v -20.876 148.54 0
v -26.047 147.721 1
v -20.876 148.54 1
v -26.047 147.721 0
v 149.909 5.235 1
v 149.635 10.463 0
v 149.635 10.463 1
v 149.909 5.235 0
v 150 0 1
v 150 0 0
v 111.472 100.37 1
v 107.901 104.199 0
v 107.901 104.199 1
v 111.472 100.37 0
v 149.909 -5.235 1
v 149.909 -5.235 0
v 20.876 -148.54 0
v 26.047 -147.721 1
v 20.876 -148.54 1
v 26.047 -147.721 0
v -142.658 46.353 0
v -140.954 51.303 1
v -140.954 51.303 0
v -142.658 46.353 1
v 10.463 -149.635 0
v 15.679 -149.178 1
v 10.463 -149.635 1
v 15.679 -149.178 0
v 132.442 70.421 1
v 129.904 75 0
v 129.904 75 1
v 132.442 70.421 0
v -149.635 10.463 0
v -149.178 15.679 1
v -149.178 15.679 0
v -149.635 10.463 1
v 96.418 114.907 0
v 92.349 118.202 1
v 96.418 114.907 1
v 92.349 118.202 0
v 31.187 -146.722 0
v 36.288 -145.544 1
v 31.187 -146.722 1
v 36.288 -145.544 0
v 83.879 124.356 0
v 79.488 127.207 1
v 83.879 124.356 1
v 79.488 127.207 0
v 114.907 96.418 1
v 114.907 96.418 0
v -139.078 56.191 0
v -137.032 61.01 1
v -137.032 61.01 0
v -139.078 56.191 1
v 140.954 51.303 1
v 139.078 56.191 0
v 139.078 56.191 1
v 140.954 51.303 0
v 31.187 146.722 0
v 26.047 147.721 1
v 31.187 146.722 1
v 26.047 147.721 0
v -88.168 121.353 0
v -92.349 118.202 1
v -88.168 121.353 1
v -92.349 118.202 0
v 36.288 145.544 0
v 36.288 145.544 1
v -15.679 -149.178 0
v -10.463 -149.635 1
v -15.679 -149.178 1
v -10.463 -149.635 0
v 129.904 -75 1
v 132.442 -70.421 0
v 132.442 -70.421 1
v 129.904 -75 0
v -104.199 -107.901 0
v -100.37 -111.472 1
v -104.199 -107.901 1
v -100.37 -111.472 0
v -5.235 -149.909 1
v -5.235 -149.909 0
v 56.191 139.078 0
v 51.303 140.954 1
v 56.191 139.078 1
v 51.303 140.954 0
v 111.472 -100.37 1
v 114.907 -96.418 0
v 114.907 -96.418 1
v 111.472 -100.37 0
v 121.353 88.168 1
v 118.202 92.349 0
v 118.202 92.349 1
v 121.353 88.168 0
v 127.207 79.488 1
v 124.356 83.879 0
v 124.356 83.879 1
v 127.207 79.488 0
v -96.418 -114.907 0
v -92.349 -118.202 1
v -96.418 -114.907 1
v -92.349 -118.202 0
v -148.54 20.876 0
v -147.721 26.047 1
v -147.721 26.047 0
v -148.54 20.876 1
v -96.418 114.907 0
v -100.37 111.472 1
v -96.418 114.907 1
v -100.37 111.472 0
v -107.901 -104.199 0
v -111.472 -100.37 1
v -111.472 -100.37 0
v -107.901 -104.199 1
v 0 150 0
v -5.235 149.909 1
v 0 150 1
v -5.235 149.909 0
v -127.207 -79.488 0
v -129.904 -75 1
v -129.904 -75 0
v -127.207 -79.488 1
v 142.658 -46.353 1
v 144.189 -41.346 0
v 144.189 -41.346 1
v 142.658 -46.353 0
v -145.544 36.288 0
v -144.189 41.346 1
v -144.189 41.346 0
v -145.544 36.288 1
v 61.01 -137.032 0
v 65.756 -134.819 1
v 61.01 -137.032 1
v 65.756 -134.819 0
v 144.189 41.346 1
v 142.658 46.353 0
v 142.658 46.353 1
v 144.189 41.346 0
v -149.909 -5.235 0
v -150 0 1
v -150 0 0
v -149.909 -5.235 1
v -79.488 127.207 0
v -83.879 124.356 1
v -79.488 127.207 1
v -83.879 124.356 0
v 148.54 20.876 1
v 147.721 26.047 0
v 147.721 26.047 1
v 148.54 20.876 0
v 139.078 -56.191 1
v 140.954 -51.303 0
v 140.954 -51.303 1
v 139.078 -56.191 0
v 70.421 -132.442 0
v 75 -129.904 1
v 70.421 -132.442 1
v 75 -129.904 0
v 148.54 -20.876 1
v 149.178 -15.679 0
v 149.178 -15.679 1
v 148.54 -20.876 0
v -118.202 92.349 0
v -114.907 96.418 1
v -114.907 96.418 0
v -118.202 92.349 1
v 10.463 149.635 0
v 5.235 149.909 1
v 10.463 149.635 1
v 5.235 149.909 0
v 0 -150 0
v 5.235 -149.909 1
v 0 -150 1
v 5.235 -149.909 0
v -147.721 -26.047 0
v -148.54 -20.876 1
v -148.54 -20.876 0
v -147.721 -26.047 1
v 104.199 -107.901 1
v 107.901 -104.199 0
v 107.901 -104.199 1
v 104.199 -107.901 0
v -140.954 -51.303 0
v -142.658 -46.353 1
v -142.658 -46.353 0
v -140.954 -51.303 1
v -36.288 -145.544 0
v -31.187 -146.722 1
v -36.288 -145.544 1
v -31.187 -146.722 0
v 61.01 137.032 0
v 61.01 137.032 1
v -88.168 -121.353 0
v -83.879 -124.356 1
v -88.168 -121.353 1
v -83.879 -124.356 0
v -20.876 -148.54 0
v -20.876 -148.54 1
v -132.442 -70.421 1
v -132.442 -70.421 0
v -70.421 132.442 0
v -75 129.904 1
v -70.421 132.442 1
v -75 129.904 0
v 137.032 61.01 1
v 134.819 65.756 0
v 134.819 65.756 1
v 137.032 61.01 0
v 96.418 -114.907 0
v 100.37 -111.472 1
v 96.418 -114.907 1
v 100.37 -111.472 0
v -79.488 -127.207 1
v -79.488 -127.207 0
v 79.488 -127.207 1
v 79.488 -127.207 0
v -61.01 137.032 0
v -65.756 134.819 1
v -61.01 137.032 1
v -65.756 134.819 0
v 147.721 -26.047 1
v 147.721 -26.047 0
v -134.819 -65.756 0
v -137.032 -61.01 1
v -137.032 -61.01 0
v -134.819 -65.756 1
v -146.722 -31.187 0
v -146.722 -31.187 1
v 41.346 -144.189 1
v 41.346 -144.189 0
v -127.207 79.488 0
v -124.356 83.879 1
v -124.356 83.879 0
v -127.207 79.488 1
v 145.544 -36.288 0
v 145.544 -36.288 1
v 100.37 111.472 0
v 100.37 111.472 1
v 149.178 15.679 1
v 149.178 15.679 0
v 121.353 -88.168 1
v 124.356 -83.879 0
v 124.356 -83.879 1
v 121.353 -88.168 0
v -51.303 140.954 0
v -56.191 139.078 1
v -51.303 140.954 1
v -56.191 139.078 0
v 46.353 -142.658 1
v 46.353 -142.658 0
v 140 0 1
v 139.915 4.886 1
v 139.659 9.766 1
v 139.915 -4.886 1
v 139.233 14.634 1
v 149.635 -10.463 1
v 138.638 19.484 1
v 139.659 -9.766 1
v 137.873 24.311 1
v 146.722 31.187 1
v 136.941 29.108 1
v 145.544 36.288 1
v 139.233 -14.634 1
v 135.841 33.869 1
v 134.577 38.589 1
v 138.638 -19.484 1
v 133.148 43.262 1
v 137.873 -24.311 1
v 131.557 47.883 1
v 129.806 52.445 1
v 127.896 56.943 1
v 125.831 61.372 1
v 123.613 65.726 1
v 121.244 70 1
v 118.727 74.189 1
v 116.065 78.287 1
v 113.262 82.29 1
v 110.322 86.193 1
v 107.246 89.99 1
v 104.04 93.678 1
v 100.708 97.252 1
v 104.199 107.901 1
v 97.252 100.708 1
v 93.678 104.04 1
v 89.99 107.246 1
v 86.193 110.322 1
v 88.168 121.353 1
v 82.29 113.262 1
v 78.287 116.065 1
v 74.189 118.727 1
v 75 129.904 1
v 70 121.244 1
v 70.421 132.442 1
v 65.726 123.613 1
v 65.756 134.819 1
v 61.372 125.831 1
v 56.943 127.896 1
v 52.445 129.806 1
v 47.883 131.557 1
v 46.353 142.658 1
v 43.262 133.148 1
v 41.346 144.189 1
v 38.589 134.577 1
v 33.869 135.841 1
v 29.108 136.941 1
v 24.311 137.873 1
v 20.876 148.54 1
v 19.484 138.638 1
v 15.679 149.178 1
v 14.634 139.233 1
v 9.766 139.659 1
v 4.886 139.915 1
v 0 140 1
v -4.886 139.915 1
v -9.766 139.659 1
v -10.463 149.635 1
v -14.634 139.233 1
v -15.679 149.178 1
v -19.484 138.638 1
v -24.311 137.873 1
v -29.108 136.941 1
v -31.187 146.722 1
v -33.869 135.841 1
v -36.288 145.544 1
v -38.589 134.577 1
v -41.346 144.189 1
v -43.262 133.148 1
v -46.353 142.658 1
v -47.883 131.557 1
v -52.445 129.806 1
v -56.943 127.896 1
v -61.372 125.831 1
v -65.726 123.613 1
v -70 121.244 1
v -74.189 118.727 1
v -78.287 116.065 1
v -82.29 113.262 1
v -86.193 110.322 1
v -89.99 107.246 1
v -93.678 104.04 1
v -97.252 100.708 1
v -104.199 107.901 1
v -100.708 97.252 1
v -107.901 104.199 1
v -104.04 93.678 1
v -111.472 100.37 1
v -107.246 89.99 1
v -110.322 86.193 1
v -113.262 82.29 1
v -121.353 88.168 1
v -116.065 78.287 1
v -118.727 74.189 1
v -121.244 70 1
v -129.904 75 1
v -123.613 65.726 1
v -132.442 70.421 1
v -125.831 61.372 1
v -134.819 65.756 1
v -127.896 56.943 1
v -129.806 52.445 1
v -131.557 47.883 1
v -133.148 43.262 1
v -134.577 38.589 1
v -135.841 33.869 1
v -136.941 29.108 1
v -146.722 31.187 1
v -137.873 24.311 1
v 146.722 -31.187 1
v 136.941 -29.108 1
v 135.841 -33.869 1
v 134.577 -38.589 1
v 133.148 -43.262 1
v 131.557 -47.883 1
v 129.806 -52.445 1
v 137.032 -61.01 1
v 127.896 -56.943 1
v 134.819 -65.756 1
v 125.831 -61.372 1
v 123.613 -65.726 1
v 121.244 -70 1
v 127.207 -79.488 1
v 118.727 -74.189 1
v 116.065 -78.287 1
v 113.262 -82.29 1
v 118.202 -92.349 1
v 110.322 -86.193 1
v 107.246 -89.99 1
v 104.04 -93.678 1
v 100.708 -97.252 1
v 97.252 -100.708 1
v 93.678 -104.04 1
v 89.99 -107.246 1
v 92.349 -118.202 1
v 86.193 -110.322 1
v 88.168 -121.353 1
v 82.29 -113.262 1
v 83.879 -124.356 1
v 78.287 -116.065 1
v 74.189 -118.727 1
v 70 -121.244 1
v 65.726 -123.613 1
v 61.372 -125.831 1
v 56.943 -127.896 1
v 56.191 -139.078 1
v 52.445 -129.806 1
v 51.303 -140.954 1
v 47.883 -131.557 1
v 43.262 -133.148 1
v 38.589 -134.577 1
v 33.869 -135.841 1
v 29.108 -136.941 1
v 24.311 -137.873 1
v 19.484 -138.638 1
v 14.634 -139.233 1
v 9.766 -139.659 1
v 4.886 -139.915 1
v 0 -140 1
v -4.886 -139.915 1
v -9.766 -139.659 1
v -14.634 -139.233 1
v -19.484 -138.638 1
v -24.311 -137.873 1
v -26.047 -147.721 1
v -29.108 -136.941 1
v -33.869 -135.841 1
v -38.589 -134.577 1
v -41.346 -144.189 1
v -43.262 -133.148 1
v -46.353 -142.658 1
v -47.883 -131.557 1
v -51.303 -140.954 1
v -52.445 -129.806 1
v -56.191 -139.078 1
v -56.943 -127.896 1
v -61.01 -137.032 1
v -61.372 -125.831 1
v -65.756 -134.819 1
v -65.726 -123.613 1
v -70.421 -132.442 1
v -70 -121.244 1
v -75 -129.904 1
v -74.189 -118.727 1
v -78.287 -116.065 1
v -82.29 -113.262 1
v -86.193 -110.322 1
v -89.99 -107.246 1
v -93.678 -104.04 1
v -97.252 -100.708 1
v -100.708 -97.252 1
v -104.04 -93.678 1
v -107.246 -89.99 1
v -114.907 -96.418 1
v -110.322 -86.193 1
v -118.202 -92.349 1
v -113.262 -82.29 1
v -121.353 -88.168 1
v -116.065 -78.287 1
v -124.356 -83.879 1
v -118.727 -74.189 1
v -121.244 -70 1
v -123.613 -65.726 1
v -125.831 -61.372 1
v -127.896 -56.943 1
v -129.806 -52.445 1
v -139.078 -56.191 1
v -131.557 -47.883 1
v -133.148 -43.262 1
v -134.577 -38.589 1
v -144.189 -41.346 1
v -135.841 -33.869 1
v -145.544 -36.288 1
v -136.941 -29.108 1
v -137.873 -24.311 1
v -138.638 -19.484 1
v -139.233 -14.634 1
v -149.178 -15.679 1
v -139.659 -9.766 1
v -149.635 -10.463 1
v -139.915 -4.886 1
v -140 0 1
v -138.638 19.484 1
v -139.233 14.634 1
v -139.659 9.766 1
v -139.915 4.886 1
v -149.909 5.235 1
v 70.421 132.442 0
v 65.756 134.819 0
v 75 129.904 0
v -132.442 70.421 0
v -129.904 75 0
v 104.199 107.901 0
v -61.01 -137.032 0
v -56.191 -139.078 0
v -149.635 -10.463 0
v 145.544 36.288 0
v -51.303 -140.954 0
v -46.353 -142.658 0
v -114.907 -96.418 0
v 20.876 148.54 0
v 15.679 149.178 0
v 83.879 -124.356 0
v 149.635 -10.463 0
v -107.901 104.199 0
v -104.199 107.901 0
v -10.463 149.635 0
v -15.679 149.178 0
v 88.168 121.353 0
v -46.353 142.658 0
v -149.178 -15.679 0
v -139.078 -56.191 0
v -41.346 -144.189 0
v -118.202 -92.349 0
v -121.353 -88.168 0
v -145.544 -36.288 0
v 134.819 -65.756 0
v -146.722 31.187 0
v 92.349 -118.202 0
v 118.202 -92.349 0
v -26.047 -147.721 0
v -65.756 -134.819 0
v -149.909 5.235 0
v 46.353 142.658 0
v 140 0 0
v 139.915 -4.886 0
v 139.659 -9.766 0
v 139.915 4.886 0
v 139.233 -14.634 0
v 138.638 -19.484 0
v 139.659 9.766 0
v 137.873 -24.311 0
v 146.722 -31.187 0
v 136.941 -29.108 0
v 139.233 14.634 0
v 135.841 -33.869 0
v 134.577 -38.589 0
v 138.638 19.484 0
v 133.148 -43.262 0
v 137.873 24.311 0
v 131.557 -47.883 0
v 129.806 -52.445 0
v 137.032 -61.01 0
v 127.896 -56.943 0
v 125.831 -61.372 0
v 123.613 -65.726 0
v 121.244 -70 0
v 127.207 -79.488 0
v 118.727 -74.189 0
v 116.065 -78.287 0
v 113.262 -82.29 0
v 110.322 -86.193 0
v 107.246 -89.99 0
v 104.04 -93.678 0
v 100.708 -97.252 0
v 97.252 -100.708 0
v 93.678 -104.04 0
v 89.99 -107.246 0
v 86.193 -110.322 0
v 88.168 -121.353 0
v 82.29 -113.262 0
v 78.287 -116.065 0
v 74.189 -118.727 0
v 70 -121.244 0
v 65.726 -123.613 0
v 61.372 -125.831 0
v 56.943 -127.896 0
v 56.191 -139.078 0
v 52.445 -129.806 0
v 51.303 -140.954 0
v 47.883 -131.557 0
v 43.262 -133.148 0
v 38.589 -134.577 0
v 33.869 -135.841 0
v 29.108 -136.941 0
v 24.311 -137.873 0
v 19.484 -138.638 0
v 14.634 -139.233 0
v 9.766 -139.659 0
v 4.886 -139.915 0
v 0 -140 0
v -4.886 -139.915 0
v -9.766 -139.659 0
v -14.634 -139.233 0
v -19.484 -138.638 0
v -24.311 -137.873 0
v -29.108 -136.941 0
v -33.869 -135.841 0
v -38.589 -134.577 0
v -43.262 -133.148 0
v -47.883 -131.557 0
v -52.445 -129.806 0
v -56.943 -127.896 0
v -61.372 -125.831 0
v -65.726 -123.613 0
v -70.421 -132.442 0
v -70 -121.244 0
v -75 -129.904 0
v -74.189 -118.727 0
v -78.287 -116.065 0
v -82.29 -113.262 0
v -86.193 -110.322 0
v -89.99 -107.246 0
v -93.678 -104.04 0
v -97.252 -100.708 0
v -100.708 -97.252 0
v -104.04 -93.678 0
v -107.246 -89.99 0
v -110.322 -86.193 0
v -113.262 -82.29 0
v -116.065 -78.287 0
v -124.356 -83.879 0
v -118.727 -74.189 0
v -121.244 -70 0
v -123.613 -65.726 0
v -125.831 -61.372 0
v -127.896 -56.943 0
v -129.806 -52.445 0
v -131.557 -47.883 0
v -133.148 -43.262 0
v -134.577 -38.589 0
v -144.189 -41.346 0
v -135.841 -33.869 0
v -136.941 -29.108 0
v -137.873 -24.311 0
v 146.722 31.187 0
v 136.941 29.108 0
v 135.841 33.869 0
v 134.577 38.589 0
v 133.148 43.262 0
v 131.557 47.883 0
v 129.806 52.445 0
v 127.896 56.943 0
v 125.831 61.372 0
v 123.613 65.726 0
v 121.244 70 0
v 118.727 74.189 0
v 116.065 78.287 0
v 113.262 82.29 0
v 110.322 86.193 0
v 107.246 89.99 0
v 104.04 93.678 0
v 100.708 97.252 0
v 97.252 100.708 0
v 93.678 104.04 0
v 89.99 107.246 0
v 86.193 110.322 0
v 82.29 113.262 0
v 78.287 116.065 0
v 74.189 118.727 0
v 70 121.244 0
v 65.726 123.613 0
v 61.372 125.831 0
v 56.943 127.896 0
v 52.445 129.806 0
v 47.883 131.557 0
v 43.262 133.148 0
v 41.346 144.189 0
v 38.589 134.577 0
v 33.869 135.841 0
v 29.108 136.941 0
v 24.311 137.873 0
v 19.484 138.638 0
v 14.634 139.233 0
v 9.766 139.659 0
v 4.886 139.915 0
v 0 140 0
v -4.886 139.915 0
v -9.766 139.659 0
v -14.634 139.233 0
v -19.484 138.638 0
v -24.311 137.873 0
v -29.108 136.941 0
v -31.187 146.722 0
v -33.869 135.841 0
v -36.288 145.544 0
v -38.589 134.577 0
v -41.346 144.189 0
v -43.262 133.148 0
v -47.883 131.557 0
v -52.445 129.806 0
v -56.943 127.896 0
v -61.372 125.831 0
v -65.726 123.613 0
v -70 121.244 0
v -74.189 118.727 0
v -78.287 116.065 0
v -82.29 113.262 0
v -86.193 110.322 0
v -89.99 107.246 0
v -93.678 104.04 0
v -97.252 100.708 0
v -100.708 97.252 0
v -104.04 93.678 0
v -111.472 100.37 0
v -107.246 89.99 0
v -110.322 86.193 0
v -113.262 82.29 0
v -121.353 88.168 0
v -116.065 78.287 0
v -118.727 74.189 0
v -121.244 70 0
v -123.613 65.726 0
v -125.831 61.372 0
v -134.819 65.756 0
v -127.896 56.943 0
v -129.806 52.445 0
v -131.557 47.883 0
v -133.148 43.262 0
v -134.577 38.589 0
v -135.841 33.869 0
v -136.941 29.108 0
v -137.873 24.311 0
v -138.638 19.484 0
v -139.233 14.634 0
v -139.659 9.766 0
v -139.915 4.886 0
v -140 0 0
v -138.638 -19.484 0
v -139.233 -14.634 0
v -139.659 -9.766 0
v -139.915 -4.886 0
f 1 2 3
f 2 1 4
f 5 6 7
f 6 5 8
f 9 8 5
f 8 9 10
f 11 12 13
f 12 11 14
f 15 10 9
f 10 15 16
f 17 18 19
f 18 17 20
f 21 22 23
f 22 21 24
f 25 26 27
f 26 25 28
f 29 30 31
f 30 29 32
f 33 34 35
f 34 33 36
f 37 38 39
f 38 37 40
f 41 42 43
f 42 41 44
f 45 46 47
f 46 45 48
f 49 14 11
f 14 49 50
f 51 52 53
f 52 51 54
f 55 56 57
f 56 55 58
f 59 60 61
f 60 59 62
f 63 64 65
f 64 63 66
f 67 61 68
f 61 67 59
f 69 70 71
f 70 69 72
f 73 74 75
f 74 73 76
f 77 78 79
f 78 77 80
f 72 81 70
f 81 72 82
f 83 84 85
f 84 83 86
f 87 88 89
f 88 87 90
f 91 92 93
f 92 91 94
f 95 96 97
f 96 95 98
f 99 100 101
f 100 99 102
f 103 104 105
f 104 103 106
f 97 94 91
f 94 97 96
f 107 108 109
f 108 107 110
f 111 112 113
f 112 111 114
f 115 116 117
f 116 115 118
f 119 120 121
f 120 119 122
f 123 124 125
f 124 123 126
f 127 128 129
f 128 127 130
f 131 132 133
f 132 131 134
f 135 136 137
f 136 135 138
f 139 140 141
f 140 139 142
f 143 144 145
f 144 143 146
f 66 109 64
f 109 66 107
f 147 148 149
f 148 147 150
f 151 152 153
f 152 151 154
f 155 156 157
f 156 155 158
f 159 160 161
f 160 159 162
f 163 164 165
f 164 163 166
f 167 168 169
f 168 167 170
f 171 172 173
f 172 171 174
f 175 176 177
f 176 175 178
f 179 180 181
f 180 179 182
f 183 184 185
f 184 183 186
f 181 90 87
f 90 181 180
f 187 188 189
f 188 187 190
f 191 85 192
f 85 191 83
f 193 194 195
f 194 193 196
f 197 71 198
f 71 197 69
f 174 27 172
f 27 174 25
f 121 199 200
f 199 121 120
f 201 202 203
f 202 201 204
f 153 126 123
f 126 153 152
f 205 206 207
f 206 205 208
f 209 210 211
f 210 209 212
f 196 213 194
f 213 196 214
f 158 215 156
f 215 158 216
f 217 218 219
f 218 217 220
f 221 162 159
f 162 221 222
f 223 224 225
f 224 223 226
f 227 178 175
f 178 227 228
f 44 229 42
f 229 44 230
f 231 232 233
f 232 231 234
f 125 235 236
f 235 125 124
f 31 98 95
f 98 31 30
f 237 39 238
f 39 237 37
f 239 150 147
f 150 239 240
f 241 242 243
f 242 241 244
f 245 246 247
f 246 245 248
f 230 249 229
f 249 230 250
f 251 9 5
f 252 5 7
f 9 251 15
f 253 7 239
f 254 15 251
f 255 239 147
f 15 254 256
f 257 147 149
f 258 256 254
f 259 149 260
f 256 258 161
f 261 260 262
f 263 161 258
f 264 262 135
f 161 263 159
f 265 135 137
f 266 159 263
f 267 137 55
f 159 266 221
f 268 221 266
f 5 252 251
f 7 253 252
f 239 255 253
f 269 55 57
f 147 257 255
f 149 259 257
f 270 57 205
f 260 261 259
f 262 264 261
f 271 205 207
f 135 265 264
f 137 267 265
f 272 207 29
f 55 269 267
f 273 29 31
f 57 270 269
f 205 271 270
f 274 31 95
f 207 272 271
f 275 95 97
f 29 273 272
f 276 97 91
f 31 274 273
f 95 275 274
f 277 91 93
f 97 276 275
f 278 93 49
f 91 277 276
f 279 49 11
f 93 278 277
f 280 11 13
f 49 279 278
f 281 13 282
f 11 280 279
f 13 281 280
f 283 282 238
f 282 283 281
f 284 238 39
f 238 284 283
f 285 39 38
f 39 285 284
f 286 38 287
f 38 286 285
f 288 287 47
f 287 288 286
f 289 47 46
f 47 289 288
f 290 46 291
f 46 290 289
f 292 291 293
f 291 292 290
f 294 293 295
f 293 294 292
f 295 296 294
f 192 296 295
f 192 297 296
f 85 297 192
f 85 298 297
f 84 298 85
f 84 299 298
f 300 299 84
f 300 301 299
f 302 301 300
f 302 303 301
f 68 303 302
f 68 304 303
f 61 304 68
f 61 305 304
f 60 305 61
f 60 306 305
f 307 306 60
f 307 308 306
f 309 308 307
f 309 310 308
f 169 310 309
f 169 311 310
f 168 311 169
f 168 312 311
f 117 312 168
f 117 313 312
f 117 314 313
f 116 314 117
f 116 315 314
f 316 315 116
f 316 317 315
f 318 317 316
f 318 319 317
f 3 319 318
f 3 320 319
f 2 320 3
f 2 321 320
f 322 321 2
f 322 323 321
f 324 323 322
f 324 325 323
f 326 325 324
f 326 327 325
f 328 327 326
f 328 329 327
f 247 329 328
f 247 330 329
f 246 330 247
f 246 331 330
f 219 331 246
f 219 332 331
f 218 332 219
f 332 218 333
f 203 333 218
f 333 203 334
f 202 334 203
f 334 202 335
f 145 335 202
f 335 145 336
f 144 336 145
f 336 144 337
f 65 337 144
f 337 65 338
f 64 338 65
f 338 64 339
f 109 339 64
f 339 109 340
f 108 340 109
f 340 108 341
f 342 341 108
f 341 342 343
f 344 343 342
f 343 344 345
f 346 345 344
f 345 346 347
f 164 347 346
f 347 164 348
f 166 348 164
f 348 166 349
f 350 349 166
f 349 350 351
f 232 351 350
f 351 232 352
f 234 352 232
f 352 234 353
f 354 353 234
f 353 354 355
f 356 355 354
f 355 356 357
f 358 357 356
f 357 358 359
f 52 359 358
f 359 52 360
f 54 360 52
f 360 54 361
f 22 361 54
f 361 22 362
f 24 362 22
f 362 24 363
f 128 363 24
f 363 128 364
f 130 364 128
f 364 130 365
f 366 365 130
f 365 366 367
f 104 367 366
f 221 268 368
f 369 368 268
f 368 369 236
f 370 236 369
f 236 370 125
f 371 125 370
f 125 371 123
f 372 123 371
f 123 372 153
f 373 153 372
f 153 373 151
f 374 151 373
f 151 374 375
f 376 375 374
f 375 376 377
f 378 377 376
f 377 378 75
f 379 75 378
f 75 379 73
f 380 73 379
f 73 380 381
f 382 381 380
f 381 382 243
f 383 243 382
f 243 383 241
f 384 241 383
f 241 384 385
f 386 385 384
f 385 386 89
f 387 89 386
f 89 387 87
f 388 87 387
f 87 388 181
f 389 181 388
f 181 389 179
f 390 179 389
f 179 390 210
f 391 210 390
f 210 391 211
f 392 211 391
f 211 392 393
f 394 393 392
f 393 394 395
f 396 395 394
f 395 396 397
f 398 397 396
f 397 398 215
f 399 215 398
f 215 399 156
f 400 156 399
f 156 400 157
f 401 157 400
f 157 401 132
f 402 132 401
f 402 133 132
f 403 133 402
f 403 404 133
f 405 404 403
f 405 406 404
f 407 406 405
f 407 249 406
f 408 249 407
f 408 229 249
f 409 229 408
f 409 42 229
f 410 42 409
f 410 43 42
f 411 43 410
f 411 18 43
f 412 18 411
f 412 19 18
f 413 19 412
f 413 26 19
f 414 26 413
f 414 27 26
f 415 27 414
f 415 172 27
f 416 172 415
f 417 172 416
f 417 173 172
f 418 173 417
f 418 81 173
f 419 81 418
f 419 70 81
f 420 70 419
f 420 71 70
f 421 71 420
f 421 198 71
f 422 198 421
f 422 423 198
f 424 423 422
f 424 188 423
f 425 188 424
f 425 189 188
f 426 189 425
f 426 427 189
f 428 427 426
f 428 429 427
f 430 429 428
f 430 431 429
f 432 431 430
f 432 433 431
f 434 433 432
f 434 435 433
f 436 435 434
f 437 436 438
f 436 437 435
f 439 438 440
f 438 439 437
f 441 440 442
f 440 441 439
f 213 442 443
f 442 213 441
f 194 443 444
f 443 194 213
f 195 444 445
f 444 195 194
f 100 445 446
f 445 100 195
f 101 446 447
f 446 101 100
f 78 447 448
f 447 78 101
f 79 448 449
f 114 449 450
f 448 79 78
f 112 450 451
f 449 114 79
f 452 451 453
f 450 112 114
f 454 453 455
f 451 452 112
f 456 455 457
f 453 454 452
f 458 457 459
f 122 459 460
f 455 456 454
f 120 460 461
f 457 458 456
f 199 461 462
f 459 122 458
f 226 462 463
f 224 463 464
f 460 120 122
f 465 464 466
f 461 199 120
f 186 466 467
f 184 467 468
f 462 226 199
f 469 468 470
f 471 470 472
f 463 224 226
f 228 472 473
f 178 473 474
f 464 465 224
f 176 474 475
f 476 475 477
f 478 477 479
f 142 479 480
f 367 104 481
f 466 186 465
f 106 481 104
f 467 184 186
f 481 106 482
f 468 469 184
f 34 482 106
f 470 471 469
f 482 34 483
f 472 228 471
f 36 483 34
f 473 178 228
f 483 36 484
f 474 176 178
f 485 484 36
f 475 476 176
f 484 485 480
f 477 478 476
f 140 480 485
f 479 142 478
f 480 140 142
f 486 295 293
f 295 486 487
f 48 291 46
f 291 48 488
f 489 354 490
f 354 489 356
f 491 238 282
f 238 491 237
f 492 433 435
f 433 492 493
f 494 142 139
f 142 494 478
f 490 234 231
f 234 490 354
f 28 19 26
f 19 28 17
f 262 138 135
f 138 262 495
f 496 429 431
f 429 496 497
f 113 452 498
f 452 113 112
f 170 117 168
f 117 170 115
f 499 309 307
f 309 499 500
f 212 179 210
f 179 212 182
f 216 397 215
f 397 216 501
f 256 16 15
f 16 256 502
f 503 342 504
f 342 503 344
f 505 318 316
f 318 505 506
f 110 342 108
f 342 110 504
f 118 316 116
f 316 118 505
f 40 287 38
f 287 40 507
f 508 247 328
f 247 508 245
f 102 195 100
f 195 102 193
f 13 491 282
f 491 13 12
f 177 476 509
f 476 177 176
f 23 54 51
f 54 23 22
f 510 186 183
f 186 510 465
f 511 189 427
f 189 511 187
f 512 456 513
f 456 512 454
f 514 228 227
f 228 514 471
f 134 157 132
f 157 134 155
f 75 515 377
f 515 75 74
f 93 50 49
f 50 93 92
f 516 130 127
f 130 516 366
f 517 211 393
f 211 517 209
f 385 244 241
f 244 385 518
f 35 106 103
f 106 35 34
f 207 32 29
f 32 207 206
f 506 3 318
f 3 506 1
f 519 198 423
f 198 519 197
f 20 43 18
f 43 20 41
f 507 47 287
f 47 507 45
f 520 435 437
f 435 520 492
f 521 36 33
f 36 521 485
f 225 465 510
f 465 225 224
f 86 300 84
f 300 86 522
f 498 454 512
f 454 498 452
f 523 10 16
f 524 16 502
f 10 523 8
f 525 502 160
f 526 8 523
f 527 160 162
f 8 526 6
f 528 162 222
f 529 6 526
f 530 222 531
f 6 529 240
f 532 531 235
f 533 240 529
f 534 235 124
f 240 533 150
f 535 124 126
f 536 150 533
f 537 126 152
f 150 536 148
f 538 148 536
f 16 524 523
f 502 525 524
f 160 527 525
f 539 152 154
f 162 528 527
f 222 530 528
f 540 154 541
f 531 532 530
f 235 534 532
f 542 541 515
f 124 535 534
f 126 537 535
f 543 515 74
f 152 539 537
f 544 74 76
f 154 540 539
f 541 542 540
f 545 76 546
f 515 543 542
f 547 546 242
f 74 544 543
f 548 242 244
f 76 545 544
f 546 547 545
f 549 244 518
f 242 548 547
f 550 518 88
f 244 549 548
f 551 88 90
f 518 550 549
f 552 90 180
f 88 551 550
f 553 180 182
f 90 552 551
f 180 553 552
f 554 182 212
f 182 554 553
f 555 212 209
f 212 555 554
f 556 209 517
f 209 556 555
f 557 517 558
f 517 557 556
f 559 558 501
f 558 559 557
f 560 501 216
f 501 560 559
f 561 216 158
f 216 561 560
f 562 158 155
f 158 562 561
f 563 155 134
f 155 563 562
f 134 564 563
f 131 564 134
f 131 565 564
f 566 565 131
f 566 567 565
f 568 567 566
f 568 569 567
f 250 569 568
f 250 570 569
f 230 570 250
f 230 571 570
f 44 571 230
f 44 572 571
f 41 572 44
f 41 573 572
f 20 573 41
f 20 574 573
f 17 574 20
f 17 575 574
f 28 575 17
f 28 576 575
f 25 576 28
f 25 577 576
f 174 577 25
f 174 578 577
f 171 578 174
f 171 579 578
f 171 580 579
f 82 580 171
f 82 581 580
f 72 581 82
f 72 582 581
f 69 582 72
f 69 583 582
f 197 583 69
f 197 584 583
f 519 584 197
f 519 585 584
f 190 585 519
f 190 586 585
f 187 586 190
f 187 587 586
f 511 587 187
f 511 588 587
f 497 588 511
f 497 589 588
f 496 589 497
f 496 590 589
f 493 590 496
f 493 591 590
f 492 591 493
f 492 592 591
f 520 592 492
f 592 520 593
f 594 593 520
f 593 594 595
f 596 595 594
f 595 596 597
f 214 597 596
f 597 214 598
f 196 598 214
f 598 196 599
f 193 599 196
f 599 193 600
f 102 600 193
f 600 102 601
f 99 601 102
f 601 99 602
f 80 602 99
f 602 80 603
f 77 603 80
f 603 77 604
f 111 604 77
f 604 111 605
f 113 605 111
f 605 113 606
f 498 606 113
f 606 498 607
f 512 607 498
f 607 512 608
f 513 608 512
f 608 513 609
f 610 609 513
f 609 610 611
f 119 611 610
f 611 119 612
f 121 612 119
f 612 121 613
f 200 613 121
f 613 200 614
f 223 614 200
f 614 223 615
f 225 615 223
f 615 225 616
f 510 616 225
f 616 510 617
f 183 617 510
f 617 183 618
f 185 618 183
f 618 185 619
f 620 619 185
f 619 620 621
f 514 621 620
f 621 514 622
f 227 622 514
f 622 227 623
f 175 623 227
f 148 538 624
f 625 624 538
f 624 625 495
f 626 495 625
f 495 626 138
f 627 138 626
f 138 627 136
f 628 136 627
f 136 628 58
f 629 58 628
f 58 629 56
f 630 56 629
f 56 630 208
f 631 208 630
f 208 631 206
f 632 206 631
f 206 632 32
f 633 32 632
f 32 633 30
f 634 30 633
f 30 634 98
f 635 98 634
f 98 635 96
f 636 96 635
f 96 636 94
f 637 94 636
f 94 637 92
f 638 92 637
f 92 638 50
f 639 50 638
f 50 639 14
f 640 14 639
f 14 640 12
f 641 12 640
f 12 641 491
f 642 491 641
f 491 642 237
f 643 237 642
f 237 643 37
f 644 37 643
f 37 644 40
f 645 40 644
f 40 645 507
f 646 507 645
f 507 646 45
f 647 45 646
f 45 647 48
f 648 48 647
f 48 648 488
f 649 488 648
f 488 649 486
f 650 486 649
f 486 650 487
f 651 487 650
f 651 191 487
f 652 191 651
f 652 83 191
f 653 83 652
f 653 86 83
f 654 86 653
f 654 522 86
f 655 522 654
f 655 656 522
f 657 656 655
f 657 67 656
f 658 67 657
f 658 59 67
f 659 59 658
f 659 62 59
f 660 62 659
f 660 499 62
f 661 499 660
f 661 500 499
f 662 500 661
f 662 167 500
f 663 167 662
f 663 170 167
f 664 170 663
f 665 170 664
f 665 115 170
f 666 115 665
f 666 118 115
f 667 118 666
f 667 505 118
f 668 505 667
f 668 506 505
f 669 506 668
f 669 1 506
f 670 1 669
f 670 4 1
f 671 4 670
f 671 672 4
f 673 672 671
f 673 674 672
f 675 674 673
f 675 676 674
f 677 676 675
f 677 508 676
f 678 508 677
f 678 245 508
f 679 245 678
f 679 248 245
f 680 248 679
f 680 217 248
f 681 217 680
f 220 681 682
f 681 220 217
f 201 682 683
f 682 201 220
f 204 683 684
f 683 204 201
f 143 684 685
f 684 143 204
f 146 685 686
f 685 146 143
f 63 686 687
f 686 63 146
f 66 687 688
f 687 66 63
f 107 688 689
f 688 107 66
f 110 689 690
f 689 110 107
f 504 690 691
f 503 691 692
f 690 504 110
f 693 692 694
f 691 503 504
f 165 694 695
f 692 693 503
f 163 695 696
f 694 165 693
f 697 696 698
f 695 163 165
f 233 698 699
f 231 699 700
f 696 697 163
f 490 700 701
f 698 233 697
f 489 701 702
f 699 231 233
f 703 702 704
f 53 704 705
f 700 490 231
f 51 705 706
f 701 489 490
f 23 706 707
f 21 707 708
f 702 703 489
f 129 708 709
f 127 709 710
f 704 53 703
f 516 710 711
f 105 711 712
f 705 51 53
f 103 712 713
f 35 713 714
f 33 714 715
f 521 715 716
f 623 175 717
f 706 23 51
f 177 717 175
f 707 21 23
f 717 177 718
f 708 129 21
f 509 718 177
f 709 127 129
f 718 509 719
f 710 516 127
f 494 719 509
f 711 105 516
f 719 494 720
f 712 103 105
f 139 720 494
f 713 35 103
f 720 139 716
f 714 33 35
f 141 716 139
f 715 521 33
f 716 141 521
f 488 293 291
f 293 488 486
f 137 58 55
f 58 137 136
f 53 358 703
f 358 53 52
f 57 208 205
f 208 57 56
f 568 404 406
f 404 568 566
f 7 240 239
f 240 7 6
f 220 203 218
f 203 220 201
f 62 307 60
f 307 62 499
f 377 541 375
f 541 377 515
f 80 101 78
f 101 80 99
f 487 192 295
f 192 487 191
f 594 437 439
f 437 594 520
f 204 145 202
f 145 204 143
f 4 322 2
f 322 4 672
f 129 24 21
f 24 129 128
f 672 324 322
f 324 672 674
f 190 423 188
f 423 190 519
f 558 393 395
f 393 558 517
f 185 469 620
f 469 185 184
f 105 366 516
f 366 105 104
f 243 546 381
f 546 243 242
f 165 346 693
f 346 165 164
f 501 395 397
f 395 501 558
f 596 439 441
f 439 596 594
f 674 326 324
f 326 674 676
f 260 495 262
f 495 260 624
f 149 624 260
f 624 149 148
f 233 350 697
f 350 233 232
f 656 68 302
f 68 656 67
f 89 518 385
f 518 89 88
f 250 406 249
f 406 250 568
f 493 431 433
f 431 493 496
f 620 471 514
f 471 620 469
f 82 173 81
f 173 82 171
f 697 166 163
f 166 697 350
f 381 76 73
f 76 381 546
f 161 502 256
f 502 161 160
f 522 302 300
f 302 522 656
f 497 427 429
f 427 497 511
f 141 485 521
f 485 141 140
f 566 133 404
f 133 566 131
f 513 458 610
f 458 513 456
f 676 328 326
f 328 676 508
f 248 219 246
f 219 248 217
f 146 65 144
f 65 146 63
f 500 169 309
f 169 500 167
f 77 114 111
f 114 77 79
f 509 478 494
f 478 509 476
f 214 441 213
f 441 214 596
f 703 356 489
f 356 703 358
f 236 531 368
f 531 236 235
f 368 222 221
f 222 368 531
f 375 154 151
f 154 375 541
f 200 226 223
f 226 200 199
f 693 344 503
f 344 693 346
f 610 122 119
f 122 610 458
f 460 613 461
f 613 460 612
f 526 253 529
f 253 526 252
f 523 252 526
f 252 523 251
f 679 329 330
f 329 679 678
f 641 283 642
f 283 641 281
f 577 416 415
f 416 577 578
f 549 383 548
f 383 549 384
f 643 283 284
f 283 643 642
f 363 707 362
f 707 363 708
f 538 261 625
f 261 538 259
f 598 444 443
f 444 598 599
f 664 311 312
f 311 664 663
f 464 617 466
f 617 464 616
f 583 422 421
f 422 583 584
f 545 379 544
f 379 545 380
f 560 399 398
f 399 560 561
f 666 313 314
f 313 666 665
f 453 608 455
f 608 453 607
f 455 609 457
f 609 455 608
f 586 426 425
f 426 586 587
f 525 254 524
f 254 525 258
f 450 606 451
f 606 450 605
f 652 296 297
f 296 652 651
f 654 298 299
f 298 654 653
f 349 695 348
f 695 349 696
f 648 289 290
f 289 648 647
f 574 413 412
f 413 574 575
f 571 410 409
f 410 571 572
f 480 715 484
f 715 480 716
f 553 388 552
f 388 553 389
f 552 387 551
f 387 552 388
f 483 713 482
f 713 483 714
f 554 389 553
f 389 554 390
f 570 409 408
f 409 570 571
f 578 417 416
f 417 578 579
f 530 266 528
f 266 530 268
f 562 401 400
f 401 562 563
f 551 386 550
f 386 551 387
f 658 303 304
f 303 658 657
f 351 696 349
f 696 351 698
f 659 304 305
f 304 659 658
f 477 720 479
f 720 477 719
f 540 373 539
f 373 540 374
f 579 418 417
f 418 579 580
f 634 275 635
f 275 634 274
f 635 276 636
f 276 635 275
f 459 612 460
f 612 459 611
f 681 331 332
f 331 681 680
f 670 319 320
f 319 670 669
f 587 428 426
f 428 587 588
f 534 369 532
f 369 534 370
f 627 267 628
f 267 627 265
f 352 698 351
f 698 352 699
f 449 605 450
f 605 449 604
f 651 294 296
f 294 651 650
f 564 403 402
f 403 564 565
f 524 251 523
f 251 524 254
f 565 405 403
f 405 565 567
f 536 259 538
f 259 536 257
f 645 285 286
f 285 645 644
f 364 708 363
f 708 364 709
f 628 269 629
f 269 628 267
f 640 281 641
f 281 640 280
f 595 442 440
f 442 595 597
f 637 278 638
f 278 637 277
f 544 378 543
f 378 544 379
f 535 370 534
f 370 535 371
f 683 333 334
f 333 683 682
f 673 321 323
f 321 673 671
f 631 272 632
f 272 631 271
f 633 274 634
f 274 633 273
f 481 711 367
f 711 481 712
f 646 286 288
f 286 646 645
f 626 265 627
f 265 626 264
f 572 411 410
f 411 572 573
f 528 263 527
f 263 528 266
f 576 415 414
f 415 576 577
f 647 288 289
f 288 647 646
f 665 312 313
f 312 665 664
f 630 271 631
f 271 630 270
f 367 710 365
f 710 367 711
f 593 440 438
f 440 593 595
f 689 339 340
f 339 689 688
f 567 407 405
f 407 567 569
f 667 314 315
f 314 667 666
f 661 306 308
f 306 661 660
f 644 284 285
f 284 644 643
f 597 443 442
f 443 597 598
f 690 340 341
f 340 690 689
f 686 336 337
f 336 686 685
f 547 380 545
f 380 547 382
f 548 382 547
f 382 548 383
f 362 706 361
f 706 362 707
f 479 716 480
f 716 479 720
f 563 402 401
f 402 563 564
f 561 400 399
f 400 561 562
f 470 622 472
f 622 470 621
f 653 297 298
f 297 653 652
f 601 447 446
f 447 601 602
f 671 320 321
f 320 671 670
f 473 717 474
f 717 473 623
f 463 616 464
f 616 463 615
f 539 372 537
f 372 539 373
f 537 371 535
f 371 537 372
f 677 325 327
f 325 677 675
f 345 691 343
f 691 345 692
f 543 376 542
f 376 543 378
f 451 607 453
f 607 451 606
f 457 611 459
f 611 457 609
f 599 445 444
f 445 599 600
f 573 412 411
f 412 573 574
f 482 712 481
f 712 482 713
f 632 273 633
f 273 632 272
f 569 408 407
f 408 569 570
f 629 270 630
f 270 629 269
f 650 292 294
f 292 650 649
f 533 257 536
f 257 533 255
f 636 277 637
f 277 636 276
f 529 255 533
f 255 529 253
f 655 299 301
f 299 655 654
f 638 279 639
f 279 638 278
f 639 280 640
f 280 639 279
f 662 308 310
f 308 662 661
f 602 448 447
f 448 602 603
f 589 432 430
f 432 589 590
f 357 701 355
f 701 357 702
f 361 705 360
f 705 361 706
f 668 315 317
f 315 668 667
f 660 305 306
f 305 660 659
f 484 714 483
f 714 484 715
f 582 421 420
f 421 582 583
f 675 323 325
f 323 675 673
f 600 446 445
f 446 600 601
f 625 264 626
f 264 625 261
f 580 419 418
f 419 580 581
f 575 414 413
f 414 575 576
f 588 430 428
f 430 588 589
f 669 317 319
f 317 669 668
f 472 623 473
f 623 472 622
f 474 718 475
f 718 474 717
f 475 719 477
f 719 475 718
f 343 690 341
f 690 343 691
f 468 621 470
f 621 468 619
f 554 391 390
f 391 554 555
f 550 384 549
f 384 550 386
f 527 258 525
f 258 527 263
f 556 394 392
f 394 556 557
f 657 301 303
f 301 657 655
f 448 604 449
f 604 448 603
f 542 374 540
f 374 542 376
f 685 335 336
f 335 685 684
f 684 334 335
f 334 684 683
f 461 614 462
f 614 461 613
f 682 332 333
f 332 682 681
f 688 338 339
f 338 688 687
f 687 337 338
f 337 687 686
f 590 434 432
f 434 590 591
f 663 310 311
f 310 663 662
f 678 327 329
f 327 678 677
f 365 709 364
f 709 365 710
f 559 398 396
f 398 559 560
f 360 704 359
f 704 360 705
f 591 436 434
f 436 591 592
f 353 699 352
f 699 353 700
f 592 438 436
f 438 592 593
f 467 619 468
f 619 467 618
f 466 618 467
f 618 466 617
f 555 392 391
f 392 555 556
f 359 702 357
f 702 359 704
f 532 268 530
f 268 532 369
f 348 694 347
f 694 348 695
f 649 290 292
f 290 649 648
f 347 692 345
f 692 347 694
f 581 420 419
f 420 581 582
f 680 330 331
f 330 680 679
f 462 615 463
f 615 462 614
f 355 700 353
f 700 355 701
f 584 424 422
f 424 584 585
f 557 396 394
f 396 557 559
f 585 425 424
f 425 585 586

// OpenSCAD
// projection()

  difference()
{

 cylinder(h=1, r=150, $fa=2);
 translate([0,0,-1])
  cylinder(h=3, r= 140, $fa=2);

}
